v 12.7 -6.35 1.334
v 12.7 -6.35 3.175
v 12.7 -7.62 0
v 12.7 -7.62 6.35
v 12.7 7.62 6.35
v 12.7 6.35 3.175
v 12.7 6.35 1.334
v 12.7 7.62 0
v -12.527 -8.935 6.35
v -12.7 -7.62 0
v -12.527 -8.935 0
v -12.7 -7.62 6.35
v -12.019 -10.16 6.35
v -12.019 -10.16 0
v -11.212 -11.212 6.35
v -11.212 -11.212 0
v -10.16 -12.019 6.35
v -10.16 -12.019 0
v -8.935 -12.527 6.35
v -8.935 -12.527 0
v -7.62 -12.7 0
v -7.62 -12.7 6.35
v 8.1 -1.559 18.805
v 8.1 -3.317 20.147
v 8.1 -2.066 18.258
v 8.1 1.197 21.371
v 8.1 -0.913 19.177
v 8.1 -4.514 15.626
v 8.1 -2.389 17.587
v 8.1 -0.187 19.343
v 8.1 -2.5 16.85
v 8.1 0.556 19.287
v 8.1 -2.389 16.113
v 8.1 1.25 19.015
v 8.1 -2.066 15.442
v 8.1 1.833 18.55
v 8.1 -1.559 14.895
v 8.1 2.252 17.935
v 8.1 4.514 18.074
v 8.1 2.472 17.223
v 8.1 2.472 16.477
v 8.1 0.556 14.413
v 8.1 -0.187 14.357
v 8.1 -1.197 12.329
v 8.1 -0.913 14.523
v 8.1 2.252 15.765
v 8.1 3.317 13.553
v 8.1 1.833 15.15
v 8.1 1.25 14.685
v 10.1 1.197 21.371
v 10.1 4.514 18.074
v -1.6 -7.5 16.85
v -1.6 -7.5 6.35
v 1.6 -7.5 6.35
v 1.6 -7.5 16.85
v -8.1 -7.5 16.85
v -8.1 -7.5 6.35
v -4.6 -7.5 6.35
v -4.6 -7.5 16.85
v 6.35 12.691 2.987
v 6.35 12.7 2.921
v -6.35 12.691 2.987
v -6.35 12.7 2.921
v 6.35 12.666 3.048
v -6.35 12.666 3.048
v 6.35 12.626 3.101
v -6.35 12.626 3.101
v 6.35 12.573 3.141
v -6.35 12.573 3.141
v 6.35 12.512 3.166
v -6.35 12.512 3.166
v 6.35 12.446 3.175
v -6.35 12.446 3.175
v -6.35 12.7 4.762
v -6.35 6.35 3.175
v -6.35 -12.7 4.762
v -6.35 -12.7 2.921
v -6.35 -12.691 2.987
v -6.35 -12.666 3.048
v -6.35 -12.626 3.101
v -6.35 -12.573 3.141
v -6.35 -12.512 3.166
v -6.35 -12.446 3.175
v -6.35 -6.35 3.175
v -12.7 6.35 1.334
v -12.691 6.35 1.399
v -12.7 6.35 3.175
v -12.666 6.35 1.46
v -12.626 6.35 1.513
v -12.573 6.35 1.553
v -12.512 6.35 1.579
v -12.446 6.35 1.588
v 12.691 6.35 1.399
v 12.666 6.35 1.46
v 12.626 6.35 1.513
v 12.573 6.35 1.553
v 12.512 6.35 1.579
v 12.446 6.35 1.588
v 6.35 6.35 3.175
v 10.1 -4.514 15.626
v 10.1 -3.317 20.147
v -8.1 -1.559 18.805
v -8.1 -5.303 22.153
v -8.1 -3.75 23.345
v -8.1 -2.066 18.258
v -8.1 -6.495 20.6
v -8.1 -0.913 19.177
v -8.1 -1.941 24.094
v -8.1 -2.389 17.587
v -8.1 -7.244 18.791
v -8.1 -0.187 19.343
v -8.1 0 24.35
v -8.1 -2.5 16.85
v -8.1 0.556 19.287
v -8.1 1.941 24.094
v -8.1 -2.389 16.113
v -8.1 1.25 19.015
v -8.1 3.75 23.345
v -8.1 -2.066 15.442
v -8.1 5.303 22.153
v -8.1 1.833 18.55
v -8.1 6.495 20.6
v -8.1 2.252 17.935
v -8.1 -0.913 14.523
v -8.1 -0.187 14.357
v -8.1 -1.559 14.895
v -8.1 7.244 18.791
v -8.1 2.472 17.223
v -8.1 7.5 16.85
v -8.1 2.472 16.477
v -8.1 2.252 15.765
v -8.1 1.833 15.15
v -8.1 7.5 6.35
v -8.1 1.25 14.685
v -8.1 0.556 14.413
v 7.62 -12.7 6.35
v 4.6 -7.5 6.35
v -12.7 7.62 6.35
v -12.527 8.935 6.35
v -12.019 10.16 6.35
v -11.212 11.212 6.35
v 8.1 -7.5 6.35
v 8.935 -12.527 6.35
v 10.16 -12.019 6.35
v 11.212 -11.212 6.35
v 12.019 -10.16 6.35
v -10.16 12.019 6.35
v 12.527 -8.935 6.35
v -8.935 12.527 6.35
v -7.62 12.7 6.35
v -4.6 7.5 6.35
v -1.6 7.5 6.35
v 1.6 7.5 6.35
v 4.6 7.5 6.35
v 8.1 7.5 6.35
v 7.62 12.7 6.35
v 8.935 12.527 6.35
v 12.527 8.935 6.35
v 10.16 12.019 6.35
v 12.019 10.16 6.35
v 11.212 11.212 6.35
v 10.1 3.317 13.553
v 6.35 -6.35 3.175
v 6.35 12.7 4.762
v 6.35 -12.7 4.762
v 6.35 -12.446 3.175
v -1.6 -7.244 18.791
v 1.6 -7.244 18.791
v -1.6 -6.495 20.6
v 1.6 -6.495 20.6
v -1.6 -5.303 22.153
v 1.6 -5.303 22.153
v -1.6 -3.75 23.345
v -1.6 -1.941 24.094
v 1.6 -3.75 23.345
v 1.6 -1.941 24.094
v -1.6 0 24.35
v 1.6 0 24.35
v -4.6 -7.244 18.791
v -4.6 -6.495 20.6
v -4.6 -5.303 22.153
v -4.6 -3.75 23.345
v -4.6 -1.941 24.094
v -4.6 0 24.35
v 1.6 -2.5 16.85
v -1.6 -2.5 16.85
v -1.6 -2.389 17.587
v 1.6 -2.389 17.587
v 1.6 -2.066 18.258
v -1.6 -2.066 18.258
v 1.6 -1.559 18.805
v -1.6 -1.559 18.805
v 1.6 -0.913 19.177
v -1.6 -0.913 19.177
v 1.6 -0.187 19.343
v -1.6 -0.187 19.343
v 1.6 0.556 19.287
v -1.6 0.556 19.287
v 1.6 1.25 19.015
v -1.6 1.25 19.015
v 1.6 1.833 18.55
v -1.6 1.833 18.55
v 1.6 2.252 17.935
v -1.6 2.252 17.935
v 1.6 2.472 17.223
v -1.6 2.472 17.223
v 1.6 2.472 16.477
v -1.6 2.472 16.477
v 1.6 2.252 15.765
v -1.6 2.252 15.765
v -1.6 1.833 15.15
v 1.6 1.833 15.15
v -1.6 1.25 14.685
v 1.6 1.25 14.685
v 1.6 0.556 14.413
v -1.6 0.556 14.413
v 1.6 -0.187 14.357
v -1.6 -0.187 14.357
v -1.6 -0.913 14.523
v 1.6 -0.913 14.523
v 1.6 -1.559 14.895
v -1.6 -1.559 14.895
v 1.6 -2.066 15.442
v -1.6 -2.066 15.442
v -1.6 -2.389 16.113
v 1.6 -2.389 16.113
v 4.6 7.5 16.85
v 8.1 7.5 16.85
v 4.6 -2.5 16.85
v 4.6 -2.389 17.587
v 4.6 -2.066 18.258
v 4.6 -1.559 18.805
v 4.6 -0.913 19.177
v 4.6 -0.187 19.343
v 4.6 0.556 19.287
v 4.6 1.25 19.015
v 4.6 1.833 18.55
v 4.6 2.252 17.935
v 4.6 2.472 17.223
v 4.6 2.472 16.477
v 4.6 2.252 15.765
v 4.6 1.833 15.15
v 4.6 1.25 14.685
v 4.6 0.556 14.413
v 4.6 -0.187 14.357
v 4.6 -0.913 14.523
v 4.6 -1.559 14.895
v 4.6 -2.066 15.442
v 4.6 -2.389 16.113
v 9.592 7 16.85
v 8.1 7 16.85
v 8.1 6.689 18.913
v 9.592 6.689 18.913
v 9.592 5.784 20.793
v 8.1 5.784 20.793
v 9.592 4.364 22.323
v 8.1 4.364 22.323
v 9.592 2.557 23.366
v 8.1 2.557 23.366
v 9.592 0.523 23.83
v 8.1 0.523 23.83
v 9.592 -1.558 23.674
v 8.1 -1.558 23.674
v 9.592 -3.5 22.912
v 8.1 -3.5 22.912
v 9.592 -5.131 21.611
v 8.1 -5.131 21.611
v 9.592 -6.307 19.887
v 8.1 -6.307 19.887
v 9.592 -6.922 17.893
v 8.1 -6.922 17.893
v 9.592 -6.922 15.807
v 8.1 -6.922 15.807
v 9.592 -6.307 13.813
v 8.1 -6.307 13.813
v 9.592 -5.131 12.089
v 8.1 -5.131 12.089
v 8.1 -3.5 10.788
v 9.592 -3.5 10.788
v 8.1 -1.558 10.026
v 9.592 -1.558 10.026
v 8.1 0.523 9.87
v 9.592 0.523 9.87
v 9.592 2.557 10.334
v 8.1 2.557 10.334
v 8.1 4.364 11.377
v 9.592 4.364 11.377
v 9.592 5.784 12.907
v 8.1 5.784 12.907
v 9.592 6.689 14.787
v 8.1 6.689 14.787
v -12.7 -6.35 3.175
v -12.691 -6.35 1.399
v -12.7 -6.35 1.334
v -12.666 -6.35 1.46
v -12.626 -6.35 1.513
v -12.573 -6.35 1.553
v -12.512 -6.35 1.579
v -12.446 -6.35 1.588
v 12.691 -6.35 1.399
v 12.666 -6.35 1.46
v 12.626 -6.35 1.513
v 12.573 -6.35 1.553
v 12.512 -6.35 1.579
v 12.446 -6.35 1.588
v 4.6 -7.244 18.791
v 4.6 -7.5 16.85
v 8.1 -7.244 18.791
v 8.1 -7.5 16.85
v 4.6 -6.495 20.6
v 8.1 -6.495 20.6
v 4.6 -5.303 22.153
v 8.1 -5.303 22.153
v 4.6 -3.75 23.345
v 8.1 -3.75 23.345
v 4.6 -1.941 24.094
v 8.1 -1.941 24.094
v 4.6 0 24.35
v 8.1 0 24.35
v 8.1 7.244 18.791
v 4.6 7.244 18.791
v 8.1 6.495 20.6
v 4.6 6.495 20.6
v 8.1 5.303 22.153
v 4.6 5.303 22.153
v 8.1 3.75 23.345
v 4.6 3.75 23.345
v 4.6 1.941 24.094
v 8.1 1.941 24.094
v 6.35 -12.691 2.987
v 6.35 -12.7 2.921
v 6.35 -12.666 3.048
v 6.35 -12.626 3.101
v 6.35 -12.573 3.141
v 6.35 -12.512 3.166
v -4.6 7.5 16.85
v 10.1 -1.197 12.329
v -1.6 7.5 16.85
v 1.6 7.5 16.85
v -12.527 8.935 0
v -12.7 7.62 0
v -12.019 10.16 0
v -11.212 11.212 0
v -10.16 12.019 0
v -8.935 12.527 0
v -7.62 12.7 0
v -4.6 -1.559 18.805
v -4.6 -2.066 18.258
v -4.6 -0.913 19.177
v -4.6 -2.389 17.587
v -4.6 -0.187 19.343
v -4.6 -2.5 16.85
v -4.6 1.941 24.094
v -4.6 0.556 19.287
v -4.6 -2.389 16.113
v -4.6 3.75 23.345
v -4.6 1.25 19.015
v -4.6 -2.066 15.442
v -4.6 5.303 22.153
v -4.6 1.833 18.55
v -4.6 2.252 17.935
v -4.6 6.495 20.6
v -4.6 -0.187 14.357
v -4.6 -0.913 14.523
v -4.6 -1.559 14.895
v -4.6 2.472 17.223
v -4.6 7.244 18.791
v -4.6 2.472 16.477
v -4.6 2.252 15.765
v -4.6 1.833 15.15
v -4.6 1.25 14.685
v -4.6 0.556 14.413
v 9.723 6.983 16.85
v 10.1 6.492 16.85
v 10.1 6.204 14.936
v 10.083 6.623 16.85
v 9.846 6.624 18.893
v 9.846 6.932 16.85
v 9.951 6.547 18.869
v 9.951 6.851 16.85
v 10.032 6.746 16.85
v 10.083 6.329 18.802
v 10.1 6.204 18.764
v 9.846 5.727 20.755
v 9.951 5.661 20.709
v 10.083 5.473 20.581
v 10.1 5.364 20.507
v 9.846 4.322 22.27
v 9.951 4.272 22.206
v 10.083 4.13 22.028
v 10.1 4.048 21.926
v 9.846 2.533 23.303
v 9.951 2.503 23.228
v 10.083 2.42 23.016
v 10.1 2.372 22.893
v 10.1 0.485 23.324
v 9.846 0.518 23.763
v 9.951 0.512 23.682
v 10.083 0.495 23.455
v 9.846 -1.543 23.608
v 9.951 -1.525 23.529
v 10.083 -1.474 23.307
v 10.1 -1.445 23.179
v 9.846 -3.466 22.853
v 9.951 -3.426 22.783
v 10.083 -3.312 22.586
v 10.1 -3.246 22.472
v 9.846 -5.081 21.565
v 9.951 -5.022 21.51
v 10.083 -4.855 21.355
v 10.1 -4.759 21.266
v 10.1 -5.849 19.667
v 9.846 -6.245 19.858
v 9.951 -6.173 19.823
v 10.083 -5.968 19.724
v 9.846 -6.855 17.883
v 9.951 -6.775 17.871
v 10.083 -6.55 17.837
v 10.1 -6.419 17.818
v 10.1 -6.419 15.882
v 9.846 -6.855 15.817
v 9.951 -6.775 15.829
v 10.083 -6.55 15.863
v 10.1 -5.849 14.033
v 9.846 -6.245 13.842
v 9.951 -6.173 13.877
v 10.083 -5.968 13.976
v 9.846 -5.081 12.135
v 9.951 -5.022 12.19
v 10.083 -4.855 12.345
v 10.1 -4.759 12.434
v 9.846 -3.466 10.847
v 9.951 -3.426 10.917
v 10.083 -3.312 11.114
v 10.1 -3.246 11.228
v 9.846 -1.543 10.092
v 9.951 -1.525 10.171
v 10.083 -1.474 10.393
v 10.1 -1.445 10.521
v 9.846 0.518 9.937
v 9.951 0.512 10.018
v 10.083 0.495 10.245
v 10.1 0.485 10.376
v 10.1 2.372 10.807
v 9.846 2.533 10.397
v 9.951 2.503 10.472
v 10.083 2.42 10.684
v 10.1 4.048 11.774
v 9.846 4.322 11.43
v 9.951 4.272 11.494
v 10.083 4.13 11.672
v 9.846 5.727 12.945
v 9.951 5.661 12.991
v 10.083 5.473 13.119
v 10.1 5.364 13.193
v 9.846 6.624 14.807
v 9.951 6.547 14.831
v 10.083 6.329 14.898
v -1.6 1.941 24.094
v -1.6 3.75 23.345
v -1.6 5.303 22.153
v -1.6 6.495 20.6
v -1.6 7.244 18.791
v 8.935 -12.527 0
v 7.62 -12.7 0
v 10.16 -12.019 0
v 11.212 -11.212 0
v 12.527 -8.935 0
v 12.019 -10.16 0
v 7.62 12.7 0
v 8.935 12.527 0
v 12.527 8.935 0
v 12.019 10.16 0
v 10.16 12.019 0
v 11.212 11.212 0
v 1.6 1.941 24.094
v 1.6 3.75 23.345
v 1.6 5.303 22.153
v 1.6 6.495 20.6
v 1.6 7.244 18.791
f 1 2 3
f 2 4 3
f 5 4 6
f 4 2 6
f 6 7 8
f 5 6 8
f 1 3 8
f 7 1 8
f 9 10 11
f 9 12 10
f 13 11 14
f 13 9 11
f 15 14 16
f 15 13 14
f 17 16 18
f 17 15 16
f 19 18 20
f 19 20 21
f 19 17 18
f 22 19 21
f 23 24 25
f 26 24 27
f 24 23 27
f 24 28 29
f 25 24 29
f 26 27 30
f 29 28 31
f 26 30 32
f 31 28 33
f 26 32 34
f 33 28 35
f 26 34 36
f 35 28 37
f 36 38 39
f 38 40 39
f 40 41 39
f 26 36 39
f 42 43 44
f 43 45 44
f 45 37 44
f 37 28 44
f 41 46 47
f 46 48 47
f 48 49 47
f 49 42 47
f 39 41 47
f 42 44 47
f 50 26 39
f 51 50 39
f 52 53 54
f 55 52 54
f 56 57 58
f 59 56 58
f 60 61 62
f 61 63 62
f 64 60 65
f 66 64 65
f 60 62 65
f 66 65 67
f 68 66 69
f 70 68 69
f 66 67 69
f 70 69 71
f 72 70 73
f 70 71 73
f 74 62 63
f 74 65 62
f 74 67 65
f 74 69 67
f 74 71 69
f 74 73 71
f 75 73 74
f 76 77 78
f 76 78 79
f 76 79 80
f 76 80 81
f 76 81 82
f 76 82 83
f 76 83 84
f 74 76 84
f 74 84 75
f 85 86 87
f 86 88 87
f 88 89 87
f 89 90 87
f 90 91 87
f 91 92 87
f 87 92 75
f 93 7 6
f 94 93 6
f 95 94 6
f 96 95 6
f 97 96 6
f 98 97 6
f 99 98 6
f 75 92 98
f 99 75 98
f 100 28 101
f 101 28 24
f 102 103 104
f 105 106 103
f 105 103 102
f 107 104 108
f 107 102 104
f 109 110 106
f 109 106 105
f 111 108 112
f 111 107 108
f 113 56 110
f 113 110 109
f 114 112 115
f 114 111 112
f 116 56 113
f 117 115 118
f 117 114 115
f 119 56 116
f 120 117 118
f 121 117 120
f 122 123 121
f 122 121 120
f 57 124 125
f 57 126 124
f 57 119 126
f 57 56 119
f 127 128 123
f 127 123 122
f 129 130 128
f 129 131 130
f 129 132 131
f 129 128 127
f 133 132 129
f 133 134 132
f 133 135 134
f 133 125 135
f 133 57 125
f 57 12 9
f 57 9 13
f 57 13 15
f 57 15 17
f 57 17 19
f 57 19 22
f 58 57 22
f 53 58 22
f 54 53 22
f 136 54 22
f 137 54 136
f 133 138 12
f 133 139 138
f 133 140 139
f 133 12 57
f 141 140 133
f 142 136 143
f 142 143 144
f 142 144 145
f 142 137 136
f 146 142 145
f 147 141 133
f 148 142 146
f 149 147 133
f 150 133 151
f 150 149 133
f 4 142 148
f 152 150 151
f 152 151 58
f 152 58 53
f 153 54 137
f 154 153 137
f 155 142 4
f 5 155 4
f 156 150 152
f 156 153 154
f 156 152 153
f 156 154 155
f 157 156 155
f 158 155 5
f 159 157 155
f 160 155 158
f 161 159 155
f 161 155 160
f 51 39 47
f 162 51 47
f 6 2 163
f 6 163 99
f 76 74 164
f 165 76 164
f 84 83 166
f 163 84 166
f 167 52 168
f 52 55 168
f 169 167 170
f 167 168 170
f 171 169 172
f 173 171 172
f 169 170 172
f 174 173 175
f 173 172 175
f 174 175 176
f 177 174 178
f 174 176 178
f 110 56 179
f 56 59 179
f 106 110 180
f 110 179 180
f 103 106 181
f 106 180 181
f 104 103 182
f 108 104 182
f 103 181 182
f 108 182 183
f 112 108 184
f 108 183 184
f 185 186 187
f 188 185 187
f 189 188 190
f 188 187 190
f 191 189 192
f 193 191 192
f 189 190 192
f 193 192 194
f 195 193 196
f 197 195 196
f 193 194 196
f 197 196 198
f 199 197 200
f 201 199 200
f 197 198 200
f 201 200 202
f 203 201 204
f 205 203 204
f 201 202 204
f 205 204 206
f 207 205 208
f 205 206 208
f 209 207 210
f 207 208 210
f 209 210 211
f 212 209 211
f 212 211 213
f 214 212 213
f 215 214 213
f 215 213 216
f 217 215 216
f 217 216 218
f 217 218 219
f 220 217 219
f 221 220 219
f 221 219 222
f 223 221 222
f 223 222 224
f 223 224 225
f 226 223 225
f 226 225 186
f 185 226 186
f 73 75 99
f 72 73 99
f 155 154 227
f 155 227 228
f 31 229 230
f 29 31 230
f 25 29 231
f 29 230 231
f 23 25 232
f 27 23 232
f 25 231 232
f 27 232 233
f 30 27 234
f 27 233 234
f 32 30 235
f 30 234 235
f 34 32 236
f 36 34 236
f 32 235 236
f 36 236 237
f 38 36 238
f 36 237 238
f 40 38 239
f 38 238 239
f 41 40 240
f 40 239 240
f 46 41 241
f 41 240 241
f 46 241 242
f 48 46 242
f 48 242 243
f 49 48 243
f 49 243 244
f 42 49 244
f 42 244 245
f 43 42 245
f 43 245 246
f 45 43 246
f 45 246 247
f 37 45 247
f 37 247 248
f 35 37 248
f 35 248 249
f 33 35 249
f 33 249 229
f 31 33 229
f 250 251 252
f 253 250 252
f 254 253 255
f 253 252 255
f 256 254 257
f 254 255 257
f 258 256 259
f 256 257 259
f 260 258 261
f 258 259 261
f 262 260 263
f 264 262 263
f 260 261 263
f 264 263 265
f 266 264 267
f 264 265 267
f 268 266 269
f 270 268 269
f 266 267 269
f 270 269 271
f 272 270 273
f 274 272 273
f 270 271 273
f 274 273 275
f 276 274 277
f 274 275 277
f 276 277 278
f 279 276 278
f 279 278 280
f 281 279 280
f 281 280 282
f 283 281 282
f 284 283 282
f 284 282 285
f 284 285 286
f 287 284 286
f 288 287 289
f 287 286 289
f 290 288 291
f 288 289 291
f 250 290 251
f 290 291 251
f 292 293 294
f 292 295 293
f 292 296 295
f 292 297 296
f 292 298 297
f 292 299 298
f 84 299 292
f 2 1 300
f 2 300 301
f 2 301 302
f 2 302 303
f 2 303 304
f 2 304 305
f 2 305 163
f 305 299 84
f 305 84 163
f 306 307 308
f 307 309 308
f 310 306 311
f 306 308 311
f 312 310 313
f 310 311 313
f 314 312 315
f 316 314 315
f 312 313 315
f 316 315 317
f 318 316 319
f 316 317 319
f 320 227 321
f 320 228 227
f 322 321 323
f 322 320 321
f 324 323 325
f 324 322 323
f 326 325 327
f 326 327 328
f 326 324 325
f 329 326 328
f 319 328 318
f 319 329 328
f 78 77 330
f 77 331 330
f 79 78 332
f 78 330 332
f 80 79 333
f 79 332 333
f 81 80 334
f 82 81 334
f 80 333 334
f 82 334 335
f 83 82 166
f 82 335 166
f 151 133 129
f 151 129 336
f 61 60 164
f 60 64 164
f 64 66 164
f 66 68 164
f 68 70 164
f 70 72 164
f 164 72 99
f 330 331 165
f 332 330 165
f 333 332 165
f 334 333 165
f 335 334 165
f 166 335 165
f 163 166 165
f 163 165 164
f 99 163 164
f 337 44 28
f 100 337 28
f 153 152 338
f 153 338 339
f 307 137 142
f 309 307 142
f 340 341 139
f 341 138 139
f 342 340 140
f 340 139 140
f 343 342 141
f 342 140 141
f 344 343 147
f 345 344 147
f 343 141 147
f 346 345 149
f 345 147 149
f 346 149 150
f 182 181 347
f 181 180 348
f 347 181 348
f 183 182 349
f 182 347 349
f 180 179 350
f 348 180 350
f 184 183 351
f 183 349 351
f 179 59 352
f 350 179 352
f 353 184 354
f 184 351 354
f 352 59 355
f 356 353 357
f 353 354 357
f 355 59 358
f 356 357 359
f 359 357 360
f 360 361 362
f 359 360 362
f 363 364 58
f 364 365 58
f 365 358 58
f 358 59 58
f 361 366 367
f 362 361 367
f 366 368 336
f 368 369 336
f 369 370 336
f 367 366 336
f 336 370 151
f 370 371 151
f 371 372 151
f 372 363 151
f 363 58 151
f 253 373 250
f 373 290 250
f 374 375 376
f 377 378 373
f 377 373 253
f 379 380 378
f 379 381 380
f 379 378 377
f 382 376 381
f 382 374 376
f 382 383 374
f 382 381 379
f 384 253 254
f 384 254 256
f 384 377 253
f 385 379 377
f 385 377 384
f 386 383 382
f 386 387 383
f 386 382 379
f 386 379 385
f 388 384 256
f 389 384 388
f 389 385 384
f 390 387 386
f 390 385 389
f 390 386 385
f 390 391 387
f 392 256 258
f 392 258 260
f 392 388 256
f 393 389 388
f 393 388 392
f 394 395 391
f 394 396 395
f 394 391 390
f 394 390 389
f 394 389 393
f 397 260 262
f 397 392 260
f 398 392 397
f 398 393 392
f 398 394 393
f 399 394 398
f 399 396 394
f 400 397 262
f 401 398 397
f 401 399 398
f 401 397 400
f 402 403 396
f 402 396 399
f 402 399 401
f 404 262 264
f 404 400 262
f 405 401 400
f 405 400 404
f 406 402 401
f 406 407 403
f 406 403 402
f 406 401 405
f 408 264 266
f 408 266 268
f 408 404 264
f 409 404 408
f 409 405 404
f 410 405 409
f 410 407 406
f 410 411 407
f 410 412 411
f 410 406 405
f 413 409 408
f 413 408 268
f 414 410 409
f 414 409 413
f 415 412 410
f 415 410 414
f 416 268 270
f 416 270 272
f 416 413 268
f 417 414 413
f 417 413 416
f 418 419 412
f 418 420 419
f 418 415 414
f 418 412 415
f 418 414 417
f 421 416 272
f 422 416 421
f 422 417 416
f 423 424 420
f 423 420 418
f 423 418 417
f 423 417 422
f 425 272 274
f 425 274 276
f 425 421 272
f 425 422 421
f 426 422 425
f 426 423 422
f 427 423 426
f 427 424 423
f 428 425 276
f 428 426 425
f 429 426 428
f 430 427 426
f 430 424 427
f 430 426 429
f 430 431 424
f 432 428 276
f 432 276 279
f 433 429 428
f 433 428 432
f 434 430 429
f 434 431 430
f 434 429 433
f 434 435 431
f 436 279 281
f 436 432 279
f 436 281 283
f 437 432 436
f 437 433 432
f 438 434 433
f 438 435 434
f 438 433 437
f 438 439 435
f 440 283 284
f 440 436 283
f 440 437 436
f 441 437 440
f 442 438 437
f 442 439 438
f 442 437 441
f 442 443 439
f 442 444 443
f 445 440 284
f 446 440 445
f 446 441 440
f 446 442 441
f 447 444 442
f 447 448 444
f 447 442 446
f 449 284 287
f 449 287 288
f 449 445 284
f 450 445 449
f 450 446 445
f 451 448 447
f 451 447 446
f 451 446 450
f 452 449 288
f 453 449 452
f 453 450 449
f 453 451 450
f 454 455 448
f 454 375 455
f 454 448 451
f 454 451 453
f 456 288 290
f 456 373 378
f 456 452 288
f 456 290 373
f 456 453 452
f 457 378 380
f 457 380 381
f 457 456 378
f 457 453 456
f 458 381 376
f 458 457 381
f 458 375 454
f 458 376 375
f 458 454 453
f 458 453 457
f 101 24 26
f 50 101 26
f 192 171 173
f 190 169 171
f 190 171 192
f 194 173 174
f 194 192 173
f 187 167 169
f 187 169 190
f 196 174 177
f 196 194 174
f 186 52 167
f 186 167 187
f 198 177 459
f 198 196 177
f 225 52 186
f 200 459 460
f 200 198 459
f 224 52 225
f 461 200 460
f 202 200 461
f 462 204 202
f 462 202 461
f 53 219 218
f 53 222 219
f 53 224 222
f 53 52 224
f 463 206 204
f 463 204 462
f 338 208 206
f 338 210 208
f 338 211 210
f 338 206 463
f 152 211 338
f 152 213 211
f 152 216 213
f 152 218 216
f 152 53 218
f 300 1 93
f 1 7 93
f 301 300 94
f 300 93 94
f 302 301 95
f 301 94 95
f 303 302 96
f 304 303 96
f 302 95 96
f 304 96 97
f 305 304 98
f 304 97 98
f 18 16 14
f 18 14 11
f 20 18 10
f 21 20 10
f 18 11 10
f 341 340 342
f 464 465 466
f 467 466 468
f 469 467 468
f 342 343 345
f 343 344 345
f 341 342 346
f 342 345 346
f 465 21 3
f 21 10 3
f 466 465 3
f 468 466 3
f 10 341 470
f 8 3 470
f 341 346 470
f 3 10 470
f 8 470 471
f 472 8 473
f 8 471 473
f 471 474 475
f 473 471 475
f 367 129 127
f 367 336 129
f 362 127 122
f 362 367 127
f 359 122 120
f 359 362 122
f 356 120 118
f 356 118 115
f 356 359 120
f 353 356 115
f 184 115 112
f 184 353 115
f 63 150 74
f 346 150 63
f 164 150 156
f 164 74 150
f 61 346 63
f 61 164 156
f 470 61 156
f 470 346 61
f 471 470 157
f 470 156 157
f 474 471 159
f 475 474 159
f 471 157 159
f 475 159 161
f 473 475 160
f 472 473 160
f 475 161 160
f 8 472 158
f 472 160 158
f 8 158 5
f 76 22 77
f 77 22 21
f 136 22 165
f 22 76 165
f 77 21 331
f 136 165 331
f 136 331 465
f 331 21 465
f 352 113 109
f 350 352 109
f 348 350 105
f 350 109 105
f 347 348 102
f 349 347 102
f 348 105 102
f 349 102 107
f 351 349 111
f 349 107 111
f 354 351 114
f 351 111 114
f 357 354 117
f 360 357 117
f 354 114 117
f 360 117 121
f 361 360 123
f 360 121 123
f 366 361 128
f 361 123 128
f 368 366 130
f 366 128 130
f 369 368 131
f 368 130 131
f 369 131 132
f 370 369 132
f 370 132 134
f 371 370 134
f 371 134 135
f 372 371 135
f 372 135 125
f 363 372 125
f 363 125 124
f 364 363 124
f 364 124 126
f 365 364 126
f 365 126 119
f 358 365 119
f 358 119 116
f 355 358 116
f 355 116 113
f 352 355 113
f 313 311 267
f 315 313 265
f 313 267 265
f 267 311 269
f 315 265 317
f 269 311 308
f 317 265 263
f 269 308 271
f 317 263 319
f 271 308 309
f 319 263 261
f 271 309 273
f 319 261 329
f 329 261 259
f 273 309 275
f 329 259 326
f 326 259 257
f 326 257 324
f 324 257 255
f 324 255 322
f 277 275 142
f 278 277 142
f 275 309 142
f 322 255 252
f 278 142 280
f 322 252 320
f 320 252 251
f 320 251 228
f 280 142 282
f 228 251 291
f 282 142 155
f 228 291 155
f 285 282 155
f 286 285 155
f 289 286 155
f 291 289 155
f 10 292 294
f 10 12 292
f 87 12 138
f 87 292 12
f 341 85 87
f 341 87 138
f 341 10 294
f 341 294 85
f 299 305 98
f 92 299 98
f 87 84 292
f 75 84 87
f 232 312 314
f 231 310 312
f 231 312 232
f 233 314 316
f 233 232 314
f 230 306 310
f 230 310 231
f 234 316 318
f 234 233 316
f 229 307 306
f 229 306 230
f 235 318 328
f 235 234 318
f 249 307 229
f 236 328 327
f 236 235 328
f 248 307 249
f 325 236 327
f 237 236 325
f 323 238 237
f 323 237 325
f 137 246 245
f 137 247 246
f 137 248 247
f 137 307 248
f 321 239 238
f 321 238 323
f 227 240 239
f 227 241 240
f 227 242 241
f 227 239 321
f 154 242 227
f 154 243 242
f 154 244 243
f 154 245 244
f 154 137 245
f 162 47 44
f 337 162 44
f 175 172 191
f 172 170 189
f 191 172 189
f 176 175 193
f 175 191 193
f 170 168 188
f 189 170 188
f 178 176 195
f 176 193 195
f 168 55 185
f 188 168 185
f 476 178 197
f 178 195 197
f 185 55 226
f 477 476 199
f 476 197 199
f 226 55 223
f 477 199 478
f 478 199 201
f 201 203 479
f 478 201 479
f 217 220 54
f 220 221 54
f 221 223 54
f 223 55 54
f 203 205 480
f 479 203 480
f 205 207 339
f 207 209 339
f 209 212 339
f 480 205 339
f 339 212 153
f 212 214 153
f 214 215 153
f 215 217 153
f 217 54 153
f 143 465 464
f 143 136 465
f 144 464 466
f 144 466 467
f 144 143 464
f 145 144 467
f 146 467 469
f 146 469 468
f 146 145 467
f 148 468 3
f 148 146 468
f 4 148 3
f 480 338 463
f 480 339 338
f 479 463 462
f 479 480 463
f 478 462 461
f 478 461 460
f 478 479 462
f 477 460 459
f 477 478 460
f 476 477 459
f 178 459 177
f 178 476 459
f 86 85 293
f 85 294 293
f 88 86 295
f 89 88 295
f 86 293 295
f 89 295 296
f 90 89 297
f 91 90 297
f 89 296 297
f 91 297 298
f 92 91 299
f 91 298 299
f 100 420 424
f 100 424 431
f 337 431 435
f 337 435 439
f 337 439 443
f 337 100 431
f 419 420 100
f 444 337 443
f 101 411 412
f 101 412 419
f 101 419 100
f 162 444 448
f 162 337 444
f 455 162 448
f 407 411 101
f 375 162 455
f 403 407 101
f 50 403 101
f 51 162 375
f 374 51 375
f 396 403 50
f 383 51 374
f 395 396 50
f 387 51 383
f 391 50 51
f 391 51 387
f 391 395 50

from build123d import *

# Parameters (mm, degrees)
F0_W      = 25.4
F0_H      = 25.4
F1_DEPTH  = 6.35
F2_W      = 12.7
F2_H      = 1.5875
F3_DEPTH  = 25.401
F4_W      = 12.7
F4_H      = 1.5875
F5_DEPTH  = 25.401
F6_W      = 3.5
F6_H      = 15
F6_W_2    = 3.2
F7_DEPTH  = 18
F8_R      = 7.49999
F9_R      = 5.08
F10_R     = 7
F11_DEPTH = 2
F12_D     = 5
F13_R     = 0.508
F14_R     = 0.254


# Not quite as in the source:
# - a fillet or chamfer is up to 0.001 mm smaller than in the source, because OpenCascade refuses the exact size


with BuildPart() as f1:
    # F0 (on Top) → F1 (new body)
    with BuildSketch(Plane.XY):
        Rectangle(F0_W, F0_H)
    extrude(amount=F1_DEPTH)

    # F2 (on face) → F3 (cut, through all)
    with BuildSketch(Plane.YZ.offset(12.7)):
        with Locations((0, 2.38125)):
            Rectangle(F2_W, F2_H)
    extrude(amount=-F3_DEPTH, mode=Mode.SUBTRACT)

    # F4 (on face) → F5 (cut, through all)
    with BuildSketch(Plane.XZ.offset(12.7)):
        with Locations((0, 3.96875)):
            Rectangle(F4_W, F4_H)
    extrude(amount=-F5_DEPTH, mode=Mode.SUBTRACT)

    # F6 (on face) → F7 (join)
    with BuildSketch(Plane.XY.offset(6.35)):
        with Locations((-6.35, 0)):
            Rectangle(F6_W, F6_H)
        Rectangle(F6_W_2, F6_H)
        with Locations((6.35, 0)):
            Rectangle(F6_W, F6_H)
    extrude(amount=F7_DEPTH)

    # F8 (radius 7.5 in the source; OpenCascade refuses exactly that, so slightly less here)
    f8_edges = [f1.edges().sort_by_distance(p)[0] for p in [
        (6.35, -7.5, 24.35),
        (0, -7.5, 24.35),
        (-6.35, -7.5, 24.35),
        (-6.35, 7.5, 24.35),
        (6.35, 7.5, 24.35),
        (0, 7.5, 24.35),
    ]]
    fillet(f8_edges, radius=F8_R)

    # F9
    f9_edges = [f1.edges().sort_by_distance(p)[0] for p in [
        (12.7, 12.7, 3.175),
        (12.7, -12.7, 3.175),
        (-12.7, 12.7, 3.175),
        (-12.7, -12.7, 3.175),
    ]]
    fillet(f9_edges, radius=F9_R)

    # F10 (on face) → F11 (join)
    with BuildSketch(Plane.YZ.offset(8.1)):
        with Locations((0, 16.85)):
            Circle(F10_R)
        Polygon((-4.5135996016, 15.6263094195), (-3.3165469299, 20.1470466272), (1.1970526717, 21.3707372077), (4.5135996016, 18.0736905805), (3.3165469299, 13.5529533728), (-1.1970526717, 12.3292627923), align=None, mode=Mode.SUBTRACT)
    extrude(amount=F11_DEPTH)

    # F12 (through all)
    with Locations(Plane.YZ.offset(8.1)):
        with Locations((0, 16.85)):
            Hole(F12_D / 2)

    # F13
    f13_edges = [f1.edges().sort_by_distance(p)[0] for p in [
        (10.1, -7, 16.85),
    ]]
    fillet(f13_edges, radius=F13_R)

    # F14
    f14_edges = [f1.edges().sort_by_distance(p)[0] for p in [
        (-12.7, 0, 1.5875),
        (0, -12.7, 3.175),
        (12.7, 0, 1.5875),
        (0, 12.7, 3.175),
    ]]
    fillet(f14_edges, radius=F14_R)


solid = f1.part
